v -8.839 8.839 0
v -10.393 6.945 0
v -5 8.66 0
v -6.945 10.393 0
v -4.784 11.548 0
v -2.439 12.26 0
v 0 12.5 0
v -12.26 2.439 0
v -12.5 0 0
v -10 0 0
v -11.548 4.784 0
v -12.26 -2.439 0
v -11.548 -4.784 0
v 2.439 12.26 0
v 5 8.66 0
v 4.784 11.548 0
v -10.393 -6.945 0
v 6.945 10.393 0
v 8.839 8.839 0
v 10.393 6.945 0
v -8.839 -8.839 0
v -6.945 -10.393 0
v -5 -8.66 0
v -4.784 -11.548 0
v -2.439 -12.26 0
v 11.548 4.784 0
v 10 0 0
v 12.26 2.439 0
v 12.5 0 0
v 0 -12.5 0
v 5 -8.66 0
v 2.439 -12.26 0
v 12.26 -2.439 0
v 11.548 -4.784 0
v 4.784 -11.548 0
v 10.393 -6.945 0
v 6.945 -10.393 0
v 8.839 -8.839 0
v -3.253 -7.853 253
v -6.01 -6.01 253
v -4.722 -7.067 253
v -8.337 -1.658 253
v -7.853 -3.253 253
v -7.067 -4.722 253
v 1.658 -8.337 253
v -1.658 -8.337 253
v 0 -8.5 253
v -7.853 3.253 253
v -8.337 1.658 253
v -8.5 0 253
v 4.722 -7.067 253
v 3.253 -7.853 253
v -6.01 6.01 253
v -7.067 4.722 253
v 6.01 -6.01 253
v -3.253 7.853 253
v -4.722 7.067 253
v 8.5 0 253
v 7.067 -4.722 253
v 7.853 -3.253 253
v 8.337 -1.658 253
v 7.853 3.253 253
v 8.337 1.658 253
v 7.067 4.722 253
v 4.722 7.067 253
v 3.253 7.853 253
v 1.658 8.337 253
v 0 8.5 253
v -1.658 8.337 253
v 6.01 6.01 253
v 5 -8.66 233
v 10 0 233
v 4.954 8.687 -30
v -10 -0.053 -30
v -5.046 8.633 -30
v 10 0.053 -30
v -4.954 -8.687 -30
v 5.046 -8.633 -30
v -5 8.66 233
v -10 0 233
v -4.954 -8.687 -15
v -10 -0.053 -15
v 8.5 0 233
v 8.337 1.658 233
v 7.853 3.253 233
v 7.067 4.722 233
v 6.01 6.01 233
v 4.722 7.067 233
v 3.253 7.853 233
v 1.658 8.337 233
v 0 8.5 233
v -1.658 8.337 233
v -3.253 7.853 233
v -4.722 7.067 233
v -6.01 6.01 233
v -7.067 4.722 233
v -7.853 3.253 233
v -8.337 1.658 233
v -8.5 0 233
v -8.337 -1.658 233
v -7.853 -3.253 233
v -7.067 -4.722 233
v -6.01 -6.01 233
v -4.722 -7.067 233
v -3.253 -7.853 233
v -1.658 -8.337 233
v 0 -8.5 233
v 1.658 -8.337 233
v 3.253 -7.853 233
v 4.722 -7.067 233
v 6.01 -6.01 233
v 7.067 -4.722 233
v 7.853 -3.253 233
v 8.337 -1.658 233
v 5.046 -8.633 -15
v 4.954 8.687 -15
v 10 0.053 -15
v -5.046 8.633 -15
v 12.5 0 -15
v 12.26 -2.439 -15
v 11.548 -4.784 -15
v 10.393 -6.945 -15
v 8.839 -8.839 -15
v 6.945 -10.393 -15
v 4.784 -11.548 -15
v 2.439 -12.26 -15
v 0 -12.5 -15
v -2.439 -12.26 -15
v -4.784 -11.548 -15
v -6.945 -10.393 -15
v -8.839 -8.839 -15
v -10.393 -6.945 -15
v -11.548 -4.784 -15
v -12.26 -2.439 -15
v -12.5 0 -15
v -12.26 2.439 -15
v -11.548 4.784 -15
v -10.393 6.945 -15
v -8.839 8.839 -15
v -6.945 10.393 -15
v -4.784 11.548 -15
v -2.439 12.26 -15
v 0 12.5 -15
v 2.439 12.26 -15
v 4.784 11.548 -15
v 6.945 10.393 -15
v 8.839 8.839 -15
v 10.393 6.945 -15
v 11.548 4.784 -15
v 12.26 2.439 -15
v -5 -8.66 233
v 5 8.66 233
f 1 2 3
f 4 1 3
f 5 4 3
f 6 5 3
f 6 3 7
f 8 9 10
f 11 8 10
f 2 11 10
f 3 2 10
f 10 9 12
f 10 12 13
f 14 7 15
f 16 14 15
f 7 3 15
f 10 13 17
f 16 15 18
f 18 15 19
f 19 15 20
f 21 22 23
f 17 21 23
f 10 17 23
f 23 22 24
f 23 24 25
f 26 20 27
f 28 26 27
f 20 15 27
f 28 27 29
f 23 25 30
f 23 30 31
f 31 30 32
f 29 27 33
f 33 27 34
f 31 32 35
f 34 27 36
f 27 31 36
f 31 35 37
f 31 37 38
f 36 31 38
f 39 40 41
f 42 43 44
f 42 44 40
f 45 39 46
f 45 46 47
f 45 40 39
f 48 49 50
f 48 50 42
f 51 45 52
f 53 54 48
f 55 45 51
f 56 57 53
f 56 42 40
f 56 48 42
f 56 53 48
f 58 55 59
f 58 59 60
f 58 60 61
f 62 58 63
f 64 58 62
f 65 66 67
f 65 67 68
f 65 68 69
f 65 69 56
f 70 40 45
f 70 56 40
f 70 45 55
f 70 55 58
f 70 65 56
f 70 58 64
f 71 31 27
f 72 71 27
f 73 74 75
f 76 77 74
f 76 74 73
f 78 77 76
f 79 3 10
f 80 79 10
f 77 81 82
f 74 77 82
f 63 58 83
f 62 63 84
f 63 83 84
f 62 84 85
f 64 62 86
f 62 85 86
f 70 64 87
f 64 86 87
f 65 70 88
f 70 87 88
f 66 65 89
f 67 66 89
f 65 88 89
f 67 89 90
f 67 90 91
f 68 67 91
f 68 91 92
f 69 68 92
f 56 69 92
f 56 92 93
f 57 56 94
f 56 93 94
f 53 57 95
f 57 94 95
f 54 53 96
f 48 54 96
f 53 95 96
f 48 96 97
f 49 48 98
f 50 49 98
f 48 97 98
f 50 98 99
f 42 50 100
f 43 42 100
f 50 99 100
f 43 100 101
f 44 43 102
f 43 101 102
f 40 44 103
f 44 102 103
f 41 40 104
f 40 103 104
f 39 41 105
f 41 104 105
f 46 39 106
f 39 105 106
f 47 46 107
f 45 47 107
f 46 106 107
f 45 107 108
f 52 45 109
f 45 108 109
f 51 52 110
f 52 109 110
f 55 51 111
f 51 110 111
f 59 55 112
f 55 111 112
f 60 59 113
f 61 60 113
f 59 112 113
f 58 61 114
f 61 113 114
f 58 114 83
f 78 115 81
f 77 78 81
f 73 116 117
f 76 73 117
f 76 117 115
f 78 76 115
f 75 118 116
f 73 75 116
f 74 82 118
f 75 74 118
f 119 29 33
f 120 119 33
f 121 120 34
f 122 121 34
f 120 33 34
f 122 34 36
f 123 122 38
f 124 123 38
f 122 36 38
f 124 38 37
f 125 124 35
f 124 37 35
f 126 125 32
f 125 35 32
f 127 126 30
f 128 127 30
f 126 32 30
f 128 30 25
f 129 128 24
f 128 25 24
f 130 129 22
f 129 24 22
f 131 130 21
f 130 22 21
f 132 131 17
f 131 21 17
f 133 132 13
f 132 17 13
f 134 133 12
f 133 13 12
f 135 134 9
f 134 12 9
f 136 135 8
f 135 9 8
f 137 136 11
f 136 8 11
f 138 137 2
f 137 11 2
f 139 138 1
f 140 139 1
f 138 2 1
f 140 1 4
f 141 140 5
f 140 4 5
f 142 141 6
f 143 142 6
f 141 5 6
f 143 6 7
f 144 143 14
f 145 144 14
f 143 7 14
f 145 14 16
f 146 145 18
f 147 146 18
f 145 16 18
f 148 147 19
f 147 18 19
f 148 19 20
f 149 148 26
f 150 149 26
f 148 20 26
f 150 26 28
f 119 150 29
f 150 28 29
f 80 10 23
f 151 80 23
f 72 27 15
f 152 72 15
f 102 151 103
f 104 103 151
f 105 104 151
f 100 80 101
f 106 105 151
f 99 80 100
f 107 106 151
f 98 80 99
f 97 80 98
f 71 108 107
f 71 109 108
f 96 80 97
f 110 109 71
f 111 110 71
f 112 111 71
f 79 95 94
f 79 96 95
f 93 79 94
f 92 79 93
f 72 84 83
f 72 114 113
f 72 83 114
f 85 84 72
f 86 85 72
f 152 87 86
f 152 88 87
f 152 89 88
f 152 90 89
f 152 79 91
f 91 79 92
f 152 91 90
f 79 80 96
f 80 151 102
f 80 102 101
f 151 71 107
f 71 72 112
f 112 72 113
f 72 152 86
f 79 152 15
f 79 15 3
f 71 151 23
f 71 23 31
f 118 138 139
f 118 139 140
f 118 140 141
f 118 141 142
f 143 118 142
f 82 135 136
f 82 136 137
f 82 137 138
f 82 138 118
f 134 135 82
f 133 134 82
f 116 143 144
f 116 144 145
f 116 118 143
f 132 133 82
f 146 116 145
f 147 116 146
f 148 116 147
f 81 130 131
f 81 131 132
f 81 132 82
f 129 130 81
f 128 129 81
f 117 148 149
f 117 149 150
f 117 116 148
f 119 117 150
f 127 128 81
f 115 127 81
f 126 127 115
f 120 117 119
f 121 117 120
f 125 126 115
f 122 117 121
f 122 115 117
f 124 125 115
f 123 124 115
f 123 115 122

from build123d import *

# Parameters (mm, degrees)
F1_DEPTH = 233
F2_R     = 8.5
F3_DEPTH = 20
F4_R     = 12.5
F5_DEPTH = 15
F7_DEPTH = 15


with BuildPart() as f1:
    # F0 (on Top) → F1 (new body)
    with BuildSketch(Plane.XY):
        Polygon((5, 8.660254), (-5, 8.660254), (-10, 0), (-5, -8.660254), (5, -8.660254), (10, 0), align=None)
    extrude(amount=F1_DEPTH)

    # F2 (on face) → F3 (join)
    with BuildSketch(Plane.XY.offset(233)):
        Circle(F2_R)
    extrude(amount=F3_DEPTH)

    # F4 (on face) → F5 (join)
    with BuildSketch(Plane(origin=(0, 0, 0), x_dir=(1, 0, 0), z_dir=(0, 0, -1))):
        Circle(F4_R)
        Polygon((5, -8.660254), (-5, -8.660254), (-10, 0), (-5, 8.660254), (5, 8.660254), (10, 0), align=None, mode=Mode.SUBTRACT)
        Polygon((-10, 0), (-5, -8.660254), (5, -8.660254), (10, 0), (5, 8.660254), (-5, 8.660254), align=None)
    extrude(amount=F5_DEPTH)

    # F6 (on face) → F7 (join)
    with BuildSketch(Plane(origin=(0, 0, -15), x_dir=(1, 0, 0), z_dir=(0, 0, -1))):
        Polygon((4.953786, -8.686772), (9.999858, -0.053281), (5.046072, 8.633491), (-4.953786, 8.686772), (-9.999858, 0.053281), (-5.046072, -8.633491), align=None)
    extrude(amount=F7_DEPTH)


solid = f1.part
